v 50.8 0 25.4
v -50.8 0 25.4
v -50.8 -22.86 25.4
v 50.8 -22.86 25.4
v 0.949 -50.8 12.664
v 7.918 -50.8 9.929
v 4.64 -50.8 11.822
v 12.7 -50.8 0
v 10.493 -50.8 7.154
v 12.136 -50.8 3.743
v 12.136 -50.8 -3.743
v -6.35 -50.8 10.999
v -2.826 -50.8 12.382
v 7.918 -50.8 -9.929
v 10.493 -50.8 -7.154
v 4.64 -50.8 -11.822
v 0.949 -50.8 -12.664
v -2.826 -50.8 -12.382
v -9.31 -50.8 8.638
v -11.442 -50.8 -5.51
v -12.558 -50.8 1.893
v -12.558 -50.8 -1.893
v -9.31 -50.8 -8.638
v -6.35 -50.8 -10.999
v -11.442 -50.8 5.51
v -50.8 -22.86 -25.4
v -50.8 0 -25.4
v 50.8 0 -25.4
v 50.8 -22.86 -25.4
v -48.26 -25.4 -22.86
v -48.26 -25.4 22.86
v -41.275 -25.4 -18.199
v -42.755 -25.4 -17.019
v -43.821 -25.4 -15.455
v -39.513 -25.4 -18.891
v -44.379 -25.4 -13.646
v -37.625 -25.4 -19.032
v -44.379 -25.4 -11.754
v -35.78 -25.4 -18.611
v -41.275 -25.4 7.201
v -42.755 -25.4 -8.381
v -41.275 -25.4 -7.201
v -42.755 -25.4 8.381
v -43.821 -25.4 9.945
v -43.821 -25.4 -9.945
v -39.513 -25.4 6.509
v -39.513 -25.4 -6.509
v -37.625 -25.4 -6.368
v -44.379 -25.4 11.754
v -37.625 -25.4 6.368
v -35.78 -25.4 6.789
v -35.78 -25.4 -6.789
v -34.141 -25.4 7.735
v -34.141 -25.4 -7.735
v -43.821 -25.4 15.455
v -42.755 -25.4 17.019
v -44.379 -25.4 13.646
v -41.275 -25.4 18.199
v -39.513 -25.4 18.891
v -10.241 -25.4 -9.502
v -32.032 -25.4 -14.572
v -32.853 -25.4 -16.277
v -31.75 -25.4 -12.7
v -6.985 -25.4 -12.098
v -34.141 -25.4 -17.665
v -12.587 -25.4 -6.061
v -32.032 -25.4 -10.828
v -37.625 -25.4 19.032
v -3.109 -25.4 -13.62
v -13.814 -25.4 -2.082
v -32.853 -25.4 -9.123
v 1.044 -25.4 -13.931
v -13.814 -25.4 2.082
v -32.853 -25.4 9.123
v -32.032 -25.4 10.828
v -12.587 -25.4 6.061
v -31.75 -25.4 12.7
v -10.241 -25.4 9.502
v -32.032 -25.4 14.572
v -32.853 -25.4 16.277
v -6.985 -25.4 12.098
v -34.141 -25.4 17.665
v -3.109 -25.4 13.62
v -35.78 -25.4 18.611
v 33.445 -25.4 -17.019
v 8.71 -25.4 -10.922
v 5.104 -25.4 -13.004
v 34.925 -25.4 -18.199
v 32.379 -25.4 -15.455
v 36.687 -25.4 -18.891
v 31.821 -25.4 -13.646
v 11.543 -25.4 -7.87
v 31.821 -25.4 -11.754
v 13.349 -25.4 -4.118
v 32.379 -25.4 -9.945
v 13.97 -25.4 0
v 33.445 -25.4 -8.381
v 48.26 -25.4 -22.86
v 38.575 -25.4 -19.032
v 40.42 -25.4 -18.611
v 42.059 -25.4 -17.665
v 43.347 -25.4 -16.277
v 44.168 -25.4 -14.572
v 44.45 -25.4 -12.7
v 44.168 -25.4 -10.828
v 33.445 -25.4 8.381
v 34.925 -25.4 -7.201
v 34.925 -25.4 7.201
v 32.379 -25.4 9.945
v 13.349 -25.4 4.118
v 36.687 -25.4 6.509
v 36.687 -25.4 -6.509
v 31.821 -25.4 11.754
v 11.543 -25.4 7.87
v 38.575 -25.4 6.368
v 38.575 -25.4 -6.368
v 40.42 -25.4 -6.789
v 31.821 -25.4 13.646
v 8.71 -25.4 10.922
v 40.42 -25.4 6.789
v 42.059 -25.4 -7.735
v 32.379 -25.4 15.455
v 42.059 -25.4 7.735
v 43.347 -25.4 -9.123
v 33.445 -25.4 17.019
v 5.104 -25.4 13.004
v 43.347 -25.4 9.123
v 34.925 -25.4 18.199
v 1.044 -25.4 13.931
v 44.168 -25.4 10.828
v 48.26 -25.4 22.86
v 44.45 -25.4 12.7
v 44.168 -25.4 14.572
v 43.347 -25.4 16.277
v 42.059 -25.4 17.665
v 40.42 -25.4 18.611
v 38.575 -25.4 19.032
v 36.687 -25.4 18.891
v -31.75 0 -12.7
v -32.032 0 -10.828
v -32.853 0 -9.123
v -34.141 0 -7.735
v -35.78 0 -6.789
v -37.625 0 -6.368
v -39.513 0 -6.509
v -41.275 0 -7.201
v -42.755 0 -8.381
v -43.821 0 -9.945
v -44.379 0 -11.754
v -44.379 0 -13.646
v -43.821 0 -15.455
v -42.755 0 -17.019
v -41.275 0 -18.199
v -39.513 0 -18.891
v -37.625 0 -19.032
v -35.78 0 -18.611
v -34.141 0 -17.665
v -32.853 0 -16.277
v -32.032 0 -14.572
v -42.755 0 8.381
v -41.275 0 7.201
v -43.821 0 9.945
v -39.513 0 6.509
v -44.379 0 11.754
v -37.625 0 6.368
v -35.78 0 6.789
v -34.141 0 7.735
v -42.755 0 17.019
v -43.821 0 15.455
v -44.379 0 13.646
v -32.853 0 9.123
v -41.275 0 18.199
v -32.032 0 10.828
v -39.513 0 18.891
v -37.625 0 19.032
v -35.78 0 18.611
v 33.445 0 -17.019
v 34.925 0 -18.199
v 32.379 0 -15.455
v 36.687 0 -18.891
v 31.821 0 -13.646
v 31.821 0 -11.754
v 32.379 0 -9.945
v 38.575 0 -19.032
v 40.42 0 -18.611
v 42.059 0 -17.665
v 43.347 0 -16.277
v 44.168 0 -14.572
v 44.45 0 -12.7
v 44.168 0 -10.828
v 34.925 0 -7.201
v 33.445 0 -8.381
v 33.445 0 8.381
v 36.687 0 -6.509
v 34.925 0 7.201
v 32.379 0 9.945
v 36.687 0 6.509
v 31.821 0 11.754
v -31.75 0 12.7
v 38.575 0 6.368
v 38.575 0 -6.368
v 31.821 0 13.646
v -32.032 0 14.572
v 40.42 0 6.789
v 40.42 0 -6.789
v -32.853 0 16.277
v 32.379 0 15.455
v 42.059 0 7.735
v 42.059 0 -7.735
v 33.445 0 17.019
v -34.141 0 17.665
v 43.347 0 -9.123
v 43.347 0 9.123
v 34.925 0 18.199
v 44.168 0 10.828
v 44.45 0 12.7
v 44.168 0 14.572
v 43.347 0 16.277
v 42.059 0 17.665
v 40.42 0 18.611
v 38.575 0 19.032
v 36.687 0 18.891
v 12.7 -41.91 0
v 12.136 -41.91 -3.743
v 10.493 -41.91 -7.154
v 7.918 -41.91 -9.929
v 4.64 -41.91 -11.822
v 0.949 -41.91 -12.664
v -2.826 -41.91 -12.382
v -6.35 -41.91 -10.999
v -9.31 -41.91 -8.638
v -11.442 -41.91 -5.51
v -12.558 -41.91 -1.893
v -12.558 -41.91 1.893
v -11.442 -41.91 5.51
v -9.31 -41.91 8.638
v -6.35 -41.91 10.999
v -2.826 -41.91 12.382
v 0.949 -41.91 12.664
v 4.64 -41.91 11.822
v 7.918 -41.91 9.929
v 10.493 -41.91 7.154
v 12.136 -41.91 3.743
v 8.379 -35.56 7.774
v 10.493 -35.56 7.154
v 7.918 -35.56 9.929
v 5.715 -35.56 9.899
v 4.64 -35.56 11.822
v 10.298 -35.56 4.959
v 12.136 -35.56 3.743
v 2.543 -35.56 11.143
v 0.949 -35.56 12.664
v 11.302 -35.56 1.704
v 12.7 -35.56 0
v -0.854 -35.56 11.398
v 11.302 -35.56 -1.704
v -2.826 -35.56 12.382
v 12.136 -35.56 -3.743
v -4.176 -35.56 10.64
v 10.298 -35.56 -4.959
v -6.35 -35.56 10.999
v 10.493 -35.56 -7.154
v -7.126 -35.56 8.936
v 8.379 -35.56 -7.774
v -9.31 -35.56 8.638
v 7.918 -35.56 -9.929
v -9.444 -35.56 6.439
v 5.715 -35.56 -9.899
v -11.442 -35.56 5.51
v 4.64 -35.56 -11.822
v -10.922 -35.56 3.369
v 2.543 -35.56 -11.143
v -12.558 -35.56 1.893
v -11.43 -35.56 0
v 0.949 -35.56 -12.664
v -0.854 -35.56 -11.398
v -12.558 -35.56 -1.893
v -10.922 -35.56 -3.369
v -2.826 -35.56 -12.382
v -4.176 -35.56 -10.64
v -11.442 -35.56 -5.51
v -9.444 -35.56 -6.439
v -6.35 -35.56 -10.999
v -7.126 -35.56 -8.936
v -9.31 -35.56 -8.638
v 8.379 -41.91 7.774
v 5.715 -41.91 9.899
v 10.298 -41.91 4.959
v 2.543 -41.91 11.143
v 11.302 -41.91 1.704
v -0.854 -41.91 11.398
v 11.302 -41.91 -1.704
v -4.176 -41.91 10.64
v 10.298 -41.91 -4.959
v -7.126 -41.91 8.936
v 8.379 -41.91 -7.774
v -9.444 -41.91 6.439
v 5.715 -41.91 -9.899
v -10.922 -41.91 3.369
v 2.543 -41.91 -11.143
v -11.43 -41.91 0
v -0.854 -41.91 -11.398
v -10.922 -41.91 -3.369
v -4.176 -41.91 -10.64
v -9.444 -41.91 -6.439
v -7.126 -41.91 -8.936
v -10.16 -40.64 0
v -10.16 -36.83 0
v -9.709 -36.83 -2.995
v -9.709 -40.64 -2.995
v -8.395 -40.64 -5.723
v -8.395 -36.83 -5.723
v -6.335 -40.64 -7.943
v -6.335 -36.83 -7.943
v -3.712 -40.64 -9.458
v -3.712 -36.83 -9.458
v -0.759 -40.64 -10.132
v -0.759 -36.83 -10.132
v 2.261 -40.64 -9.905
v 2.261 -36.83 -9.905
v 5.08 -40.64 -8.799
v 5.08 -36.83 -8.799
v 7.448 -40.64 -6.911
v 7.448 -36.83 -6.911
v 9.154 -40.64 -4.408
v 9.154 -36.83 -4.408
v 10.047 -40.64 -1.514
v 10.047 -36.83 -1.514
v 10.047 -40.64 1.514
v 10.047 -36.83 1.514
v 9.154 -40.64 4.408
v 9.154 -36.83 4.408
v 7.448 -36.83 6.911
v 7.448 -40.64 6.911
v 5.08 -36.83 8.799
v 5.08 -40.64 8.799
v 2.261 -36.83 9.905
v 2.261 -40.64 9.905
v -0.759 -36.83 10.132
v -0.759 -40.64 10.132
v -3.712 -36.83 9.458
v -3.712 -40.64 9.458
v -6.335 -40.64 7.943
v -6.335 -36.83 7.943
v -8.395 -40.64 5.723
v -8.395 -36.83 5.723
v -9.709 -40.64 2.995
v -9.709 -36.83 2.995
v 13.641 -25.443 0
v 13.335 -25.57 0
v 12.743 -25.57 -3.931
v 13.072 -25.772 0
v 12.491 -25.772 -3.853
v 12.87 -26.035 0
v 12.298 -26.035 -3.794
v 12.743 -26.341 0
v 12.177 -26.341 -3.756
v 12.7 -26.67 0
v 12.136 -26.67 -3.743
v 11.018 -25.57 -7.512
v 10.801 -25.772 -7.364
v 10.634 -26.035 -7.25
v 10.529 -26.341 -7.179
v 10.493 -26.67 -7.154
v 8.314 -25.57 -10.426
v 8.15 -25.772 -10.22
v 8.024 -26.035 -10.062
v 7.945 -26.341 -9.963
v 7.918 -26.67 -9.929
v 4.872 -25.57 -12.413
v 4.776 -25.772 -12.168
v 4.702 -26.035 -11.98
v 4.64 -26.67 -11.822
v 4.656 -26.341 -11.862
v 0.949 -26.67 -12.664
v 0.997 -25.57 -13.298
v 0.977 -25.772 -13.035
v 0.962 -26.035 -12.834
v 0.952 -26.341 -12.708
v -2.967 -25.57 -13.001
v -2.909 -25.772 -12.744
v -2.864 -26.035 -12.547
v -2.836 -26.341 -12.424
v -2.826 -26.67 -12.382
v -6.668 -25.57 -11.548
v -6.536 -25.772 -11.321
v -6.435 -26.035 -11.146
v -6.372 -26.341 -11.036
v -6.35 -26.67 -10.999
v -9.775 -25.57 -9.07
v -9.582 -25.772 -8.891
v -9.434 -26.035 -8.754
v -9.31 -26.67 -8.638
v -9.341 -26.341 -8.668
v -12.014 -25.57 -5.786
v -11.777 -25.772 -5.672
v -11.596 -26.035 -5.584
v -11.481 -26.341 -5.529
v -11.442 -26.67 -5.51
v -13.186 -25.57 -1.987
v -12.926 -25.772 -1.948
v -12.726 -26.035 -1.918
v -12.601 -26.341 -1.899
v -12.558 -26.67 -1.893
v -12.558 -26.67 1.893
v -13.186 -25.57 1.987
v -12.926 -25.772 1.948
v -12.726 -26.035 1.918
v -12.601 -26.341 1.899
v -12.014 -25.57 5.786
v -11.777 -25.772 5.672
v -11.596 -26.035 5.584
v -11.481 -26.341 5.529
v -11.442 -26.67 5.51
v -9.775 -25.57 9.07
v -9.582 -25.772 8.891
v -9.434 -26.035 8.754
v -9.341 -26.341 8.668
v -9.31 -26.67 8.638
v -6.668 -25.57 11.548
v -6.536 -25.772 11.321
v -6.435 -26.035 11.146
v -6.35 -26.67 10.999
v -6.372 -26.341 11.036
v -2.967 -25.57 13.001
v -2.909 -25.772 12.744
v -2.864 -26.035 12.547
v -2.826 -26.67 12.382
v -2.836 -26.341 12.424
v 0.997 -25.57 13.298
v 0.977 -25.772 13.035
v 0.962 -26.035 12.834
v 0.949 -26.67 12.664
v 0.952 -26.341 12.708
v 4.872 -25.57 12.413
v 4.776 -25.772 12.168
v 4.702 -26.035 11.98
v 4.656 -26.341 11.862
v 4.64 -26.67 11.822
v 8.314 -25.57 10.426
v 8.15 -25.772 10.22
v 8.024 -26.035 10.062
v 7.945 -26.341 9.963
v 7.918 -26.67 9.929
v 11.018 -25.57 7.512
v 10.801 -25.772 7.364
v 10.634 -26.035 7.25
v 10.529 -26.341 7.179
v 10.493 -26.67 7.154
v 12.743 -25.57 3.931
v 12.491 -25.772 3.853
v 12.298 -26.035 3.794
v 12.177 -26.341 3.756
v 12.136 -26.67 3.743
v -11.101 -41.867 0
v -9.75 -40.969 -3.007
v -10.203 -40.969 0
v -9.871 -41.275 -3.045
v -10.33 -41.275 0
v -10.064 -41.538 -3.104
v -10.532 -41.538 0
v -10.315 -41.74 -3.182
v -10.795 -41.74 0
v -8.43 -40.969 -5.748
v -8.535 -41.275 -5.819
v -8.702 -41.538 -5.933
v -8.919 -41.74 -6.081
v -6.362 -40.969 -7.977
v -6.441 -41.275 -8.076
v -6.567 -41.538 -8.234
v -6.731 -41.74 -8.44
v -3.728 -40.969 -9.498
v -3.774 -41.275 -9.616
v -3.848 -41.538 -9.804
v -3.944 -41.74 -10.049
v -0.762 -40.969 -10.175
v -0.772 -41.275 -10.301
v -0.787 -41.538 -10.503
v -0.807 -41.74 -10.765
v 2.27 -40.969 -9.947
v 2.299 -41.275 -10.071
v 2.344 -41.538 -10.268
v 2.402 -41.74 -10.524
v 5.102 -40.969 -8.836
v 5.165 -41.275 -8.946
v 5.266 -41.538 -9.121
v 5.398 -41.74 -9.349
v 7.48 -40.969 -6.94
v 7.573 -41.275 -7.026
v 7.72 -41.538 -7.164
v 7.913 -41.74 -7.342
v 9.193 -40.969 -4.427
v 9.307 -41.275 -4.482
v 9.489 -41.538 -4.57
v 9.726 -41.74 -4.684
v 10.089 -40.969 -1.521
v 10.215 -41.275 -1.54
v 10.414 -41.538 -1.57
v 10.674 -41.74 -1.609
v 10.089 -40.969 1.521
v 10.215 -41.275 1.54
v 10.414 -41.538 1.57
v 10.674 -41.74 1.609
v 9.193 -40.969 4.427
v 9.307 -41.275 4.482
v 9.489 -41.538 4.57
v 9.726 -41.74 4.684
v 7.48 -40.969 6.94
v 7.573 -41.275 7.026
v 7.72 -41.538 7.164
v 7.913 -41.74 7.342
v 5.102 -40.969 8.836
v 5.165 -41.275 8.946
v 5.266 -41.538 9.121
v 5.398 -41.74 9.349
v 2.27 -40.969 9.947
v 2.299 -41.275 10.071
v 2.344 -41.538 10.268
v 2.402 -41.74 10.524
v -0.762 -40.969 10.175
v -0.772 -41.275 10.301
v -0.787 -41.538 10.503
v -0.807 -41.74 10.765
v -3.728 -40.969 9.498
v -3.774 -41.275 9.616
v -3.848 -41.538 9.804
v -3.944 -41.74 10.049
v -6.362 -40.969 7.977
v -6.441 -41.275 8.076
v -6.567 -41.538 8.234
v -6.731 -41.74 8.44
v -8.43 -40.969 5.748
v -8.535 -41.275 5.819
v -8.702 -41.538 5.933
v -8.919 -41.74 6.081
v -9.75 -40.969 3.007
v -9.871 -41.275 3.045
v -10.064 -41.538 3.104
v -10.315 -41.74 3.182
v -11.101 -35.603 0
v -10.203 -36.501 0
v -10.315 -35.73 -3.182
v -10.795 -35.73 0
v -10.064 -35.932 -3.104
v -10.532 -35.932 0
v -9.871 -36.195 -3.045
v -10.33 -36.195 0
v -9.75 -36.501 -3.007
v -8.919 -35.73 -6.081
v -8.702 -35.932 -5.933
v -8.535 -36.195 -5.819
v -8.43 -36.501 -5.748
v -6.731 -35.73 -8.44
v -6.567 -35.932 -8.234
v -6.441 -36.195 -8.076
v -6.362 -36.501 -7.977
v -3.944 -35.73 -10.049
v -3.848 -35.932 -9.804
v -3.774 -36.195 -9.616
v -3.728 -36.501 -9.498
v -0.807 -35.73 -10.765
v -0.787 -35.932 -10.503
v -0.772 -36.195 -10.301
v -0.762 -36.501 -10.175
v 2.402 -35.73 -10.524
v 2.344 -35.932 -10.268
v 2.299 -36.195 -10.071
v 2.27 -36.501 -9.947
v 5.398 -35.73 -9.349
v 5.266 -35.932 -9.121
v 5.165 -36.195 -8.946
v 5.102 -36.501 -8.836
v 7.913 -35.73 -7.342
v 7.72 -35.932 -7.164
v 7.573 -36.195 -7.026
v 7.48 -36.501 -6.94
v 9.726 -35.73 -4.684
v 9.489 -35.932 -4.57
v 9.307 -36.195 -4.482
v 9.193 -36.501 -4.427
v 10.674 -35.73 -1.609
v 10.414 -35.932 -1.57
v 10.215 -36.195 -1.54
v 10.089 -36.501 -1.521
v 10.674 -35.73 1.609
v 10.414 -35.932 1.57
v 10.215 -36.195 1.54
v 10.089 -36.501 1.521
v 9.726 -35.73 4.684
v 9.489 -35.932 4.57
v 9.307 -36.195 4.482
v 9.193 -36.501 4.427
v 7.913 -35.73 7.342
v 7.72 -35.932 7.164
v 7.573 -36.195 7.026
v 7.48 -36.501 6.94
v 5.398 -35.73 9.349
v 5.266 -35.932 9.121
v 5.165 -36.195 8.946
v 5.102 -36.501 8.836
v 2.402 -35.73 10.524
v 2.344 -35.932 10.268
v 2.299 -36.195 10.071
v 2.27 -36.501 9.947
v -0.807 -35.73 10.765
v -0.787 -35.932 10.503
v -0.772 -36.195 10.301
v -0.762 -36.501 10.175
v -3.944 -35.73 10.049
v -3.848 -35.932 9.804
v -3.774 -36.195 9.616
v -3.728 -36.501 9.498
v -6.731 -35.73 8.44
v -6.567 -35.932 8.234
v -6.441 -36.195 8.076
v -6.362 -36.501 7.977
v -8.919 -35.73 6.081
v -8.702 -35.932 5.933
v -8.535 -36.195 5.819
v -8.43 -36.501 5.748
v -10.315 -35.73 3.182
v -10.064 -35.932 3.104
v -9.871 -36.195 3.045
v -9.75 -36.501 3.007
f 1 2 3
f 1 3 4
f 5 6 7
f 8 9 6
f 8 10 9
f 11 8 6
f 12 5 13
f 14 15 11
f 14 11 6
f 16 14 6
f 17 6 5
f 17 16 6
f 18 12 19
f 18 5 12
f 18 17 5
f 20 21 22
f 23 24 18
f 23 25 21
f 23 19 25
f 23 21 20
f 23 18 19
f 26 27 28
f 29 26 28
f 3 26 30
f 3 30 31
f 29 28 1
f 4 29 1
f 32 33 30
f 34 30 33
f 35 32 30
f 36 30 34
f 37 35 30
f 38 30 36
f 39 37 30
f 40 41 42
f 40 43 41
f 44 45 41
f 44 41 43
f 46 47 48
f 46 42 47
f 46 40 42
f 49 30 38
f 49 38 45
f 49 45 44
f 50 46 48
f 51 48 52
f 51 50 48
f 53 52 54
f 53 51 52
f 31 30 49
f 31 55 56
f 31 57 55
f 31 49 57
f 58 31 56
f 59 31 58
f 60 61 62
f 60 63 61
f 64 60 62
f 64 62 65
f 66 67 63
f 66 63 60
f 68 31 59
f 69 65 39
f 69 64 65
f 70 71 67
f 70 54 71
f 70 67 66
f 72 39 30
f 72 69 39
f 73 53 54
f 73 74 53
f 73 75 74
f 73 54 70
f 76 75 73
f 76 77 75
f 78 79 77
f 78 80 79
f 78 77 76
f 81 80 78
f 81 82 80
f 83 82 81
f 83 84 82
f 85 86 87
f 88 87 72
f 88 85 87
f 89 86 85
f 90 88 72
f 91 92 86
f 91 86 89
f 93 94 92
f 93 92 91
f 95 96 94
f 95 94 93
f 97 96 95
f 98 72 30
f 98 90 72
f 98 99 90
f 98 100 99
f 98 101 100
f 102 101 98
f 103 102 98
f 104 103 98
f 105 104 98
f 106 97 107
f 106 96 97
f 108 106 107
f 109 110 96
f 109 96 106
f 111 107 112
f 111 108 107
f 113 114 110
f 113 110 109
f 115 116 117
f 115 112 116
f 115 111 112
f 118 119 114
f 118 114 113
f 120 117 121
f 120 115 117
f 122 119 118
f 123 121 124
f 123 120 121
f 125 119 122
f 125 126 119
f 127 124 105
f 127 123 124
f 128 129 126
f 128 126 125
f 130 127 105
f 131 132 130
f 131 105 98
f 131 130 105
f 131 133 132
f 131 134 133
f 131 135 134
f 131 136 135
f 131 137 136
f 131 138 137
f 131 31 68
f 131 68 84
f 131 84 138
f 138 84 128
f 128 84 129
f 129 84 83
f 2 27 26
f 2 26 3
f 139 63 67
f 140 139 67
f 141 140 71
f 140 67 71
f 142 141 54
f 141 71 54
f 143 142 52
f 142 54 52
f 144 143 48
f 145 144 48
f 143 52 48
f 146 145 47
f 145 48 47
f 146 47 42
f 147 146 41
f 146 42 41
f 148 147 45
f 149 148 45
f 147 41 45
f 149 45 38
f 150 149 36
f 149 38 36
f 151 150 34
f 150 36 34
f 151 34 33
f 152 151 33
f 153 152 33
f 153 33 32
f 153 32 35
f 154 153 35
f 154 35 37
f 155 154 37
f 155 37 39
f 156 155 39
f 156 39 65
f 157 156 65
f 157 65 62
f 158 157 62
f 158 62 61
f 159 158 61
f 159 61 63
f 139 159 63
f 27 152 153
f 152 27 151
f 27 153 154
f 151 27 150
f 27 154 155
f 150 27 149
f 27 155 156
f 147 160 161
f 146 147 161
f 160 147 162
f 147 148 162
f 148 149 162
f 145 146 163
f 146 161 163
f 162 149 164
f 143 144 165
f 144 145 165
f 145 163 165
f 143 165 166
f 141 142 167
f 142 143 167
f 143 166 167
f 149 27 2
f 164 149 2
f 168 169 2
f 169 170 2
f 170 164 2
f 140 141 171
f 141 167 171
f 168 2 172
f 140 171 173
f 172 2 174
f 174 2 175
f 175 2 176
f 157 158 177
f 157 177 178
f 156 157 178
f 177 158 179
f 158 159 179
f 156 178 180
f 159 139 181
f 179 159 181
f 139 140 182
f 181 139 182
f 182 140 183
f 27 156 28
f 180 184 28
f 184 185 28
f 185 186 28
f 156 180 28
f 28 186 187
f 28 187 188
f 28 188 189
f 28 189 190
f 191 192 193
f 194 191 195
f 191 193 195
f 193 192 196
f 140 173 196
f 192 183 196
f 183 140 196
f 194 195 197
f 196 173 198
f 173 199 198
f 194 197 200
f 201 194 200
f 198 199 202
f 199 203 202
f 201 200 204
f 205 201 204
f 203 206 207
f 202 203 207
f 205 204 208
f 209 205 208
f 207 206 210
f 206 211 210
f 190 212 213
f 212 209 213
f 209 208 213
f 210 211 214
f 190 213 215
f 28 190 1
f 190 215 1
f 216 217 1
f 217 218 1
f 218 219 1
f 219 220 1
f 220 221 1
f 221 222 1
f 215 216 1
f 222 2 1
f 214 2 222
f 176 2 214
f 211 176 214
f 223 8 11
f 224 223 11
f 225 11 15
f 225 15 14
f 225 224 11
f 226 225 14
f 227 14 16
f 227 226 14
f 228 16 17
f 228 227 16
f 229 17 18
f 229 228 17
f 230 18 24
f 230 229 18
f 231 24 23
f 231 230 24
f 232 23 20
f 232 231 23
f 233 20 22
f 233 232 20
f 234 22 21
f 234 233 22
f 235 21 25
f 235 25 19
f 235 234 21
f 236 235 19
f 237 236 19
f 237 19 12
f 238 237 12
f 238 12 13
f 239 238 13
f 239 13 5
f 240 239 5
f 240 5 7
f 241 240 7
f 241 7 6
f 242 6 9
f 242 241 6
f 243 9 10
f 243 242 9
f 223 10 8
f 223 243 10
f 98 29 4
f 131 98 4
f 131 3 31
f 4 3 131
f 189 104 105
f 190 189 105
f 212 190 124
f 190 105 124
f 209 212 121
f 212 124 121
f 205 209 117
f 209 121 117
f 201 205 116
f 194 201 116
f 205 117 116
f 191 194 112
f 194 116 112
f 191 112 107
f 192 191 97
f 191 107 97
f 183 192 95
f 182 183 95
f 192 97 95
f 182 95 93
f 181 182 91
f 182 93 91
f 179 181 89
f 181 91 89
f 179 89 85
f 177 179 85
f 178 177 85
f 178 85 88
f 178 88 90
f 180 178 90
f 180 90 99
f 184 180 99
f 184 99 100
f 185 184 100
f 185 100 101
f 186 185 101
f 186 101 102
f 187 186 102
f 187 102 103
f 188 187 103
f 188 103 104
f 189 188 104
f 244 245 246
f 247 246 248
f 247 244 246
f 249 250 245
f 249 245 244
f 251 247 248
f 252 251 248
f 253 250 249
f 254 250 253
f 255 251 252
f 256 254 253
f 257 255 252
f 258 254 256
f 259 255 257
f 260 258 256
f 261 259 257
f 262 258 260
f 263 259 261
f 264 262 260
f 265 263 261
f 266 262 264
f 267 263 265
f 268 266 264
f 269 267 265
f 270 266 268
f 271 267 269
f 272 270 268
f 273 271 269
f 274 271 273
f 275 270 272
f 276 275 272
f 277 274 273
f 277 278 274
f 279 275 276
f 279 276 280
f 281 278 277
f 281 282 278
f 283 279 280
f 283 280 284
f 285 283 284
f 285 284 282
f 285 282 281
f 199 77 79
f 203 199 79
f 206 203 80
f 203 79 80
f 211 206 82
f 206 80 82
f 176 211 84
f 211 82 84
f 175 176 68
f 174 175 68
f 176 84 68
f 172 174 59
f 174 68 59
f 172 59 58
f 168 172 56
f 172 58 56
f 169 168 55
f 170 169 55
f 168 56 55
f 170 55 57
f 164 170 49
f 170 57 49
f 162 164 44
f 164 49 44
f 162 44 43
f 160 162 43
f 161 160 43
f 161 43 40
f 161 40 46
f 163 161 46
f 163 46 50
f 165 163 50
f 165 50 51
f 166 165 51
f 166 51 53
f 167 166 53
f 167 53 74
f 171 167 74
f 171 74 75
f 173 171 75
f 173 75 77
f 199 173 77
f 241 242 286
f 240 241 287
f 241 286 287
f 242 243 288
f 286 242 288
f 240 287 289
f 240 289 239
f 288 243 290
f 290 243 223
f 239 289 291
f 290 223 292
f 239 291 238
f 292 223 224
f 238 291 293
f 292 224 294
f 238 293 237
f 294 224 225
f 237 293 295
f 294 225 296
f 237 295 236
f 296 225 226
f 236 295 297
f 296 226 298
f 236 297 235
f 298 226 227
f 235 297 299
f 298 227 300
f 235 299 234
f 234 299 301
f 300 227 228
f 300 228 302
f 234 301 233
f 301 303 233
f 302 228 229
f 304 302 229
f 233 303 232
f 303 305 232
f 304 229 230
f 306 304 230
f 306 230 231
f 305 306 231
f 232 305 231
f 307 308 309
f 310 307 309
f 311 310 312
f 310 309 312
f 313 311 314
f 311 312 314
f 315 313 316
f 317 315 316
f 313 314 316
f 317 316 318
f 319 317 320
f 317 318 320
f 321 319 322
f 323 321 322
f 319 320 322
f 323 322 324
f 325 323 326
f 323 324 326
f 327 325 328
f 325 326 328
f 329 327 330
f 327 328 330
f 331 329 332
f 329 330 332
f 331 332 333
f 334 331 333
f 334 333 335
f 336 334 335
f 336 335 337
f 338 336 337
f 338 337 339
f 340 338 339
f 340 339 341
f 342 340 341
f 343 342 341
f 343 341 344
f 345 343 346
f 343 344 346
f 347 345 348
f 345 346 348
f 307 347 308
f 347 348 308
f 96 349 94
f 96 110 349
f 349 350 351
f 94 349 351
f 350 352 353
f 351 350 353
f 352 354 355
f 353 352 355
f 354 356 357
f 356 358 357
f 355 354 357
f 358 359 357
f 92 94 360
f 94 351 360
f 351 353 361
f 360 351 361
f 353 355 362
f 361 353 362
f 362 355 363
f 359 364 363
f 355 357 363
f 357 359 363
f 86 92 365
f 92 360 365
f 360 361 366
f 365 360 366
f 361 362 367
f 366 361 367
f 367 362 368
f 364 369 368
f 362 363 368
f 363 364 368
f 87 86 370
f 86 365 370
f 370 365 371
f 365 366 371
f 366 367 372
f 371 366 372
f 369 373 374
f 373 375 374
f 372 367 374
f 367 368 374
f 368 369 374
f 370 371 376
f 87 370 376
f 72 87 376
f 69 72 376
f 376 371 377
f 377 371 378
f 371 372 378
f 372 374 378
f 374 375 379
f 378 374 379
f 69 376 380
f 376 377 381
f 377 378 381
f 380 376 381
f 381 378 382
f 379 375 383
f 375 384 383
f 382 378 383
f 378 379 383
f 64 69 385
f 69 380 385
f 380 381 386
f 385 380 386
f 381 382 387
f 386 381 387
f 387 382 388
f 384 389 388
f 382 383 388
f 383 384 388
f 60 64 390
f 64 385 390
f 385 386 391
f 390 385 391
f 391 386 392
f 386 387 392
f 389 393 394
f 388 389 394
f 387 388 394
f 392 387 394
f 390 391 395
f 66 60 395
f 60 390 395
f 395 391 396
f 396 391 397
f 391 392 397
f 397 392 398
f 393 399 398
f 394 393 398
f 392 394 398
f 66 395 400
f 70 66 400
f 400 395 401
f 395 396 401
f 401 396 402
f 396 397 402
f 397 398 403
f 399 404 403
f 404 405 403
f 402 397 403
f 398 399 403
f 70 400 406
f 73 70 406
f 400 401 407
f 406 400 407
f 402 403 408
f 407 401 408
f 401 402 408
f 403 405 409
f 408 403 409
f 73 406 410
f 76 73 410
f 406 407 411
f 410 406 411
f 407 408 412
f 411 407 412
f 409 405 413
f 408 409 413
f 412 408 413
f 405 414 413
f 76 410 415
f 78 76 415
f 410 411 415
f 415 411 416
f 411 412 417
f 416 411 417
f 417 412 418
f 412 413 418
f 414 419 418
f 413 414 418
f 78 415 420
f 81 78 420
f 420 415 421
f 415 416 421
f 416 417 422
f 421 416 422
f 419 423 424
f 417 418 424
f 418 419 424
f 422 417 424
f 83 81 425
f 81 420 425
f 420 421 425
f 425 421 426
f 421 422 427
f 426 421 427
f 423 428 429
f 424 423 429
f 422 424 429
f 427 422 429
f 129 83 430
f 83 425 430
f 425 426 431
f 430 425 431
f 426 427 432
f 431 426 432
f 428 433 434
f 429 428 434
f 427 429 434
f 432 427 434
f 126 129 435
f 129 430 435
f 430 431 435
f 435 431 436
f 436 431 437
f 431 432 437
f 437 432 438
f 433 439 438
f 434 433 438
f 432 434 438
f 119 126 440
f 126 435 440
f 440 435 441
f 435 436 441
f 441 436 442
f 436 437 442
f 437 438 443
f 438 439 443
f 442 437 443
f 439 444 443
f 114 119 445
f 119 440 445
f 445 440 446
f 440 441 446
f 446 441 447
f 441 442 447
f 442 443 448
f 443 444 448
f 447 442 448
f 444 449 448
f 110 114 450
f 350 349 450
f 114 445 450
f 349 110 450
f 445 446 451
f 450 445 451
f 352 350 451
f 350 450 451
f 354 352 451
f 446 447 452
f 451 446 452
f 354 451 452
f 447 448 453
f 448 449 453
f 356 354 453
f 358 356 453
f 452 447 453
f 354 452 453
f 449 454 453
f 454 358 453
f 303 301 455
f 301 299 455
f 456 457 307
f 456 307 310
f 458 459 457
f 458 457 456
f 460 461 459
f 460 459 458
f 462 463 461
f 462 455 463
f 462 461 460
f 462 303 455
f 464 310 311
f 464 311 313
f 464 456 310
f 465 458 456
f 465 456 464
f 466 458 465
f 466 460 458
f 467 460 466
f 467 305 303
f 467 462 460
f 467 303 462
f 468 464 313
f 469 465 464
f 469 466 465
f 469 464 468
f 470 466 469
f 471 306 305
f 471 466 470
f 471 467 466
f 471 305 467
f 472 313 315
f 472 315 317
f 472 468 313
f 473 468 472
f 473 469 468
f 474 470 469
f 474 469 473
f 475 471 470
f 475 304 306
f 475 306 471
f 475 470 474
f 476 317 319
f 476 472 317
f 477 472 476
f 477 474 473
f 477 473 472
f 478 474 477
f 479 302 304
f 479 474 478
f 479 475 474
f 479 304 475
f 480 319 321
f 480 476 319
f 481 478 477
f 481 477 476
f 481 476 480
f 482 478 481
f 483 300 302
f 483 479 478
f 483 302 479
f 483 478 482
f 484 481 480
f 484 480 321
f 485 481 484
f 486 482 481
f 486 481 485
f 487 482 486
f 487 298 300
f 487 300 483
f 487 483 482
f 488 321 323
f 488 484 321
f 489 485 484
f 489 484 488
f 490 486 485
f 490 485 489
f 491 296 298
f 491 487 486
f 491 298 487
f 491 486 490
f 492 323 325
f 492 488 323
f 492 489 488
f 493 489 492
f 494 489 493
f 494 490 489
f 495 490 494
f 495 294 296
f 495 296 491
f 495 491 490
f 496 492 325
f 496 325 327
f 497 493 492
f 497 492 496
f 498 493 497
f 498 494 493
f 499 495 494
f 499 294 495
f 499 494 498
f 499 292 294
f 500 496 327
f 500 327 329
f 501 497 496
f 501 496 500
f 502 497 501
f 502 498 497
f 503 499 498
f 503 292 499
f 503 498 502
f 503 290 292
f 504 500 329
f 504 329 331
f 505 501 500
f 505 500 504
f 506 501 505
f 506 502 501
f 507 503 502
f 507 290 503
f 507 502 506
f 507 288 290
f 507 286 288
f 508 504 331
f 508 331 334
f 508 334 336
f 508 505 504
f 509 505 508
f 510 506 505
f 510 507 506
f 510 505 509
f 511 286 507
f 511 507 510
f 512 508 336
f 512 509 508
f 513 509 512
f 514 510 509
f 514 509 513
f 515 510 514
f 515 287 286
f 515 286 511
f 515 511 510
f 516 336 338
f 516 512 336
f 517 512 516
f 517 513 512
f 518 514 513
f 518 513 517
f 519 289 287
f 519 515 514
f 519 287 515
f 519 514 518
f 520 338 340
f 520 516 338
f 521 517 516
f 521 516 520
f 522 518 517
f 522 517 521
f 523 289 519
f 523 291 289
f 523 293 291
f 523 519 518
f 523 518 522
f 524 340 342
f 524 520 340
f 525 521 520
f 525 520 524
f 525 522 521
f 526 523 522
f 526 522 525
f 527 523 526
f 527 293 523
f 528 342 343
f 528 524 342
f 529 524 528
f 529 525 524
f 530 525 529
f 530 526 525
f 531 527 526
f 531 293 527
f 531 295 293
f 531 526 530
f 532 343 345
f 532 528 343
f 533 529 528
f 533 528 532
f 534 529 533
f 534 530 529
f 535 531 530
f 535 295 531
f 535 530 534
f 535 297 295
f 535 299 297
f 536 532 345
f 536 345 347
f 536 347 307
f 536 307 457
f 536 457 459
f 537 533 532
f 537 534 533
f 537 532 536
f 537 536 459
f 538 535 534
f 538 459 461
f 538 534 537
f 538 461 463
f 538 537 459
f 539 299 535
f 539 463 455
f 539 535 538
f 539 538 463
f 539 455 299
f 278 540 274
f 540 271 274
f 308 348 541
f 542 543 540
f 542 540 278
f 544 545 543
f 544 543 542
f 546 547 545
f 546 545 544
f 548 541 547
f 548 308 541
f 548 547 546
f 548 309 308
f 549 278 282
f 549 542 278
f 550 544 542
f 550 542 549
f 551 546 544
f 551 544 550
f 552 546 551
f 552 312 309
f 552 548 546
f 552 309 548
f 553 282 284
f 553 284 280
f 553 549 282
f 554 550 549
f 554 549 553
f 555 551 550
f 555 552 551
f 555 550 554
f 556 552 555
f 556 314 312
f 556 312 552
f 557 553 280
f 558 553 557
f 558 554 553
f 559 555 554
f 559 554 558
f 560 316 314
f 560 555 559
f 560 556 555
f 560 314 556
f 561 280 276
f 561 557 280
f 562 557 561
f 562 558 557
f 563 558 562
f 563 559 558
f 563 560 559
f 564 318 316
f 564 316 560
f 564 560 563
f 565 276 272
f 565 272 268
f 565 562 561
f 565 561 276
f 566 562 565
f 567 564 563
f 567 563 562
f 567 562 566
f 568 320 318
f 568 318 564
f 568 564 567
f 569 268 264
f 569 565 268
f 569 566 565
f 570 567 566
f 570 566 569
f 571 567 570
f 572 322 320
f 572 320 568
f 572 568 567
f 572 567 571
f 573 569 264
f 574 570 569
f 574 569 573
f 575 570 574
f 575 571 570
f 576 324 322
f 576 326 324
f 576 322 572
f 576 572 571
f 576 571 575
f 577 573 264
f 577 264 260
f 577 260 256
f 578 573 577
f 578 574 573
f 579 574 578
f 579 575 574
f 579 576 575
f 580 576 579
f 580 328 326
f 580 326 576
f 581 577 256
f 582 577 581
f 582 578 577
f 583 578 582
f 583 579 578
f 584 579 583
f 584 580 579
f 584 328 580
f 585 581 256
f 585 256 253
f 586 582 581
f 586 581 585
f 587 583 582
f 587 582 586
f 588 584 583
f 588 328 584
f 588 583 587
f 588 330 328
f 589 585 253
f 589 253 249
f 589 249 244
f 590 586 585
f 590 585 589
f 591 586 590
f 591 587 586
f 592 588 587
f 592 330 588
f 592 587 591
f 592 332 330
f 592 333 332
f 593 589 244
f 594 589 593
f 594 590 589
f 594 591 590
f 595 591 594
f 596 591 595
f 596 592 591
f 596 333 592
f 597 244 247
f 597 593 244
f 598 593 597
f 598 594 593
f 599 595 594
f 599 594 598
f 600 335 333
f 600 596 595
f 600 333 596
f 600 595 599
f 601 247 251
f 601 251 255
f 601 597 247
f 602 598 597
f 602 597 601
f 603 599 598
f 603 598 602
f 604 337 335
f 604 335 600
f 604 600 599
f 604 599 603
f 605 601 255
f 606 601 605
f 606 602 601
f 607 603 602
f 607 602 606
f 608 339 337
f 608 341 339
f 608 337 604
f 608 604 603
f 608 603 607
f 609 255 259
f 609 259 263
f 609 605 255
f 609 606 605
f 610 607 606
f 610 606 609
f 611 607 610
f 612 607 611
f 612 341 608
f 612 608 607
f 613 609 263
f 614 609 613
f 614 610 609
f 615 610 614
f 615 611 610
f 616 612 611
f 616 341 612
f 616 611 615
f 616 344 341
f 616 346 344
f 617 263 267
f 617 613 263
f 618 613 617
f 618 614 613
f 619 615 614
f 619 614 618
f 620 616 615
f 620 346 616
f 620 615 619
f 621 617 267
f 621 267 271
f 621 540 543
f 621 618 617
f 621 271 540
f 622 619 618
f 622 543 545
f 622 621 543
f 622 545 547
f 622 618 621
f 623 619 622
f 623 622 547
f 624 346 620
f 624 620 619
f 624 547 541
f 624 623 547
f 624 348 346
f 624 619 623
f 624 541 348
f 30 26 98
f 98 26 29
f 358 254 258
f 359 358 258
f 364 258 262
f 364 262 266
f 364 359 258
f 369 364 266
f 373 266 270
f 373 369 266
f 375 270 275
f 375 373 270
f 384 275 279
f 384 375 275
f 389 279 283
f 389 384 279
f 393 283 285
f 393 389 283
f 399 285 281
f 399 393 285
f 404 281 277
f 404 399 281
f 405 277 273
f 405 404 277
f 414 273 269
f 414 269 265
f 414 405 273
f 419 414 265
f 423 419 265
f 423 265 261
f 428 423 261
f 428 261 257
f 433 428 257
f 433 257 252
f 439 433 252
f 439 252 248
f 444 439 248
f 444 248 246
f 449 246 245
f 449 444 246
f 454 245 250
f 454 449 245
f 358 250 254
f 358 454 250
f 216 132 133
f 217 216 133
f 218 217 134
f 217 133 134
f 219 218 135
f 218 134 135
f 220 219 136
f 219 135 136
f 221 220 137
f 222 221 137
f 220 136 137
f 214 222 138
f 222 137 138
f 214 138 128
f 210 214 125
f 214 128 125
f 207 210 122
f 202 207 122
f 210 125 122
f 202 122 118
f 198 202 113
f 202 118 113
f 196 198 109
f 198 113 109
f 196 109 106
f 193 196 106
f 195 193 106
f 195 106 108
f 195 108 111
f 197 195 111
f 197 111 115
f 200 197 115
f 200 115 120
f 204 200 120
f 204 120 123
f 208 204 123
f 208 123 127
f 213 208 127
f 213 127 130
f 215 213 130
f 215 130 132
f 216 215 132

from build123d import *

# Parameters (mm, degrees)
F0_W     = 101.6
F0_H     = 50.8
F1_DEPTH = 25.4
F2_R     = 6.35
F3_DEPTH = 25.401
F4_W     = 12.7
F4_H     = 25.4
F6_W     = 8.301848
F6_H     = 6.35
F8_R     = 1.27
F9_SIZE  = 2.54


with BuildPart() as f1:
    # F0 (on Front) → F1 (new body)
    with BuildSketch(Plane.XZ):
        Rectangle(F0_W, F0_H)
    extrude(amount=F1_DEPTH)

    # F2 (on face) → F3 (cut, through all)
    with BuildSketch(Plane.XZ.offset(25.4)):
        with Locations((-38.1, 12.7)):
            Circle(F2_R)
        with Locations((-38.1, -12.7)):
            Circle(F2_R)
        with Locations((38.1, 12.7)):
            Circle(F2_R)
        with Locations((38.1, -12.7)):
            Circle(F2_R)
    extrude(amount=-F3_DEPTH, mode=Mode.SUBTRACT)

    # F4 (on Top) → F5 (revolve)
    with BuildSketch(Plane.XY):
        with Locations((6.35, -38.1)):
            Rectangle(F4_W, F4_H)
    revolve(axis=Axis((0, -38.1, 0), (0, 1, 0)))

    # F6 (on Top) → F7 (revolve, cut)
    with BuildSketch(Plane.XY):
        with Locations((-14.310924, -38.735)):
            Rectangle(F6_W, F6_H)
    revolve(axis=Axis((0, -40.756147, 0), (0, -1, 0)), mode=Mode.SUBTRACT)

    # F8
    f8_edges = [f1.edges().sort_by_distance(p)[0] for p in [
        (-12.7, -25.4, 0),
        (10.16, -35.56, 0),
        (10.16, -41.91, 0),
    ]]
    fillet(f8_edges, radius=F8_R)

    # F9
    f9_edges = [f1.edges().sort_by_distance(p)[0] for p in [
        (0, -25.4, 25.4),
        (-50.8, -25.4, 0),
        (0, -25.4, -25.4),
        (50.8, -25.4, 0),
    ]]
    chamfer(f9_edges, length=F9_SIZE)


solid = f1.part
